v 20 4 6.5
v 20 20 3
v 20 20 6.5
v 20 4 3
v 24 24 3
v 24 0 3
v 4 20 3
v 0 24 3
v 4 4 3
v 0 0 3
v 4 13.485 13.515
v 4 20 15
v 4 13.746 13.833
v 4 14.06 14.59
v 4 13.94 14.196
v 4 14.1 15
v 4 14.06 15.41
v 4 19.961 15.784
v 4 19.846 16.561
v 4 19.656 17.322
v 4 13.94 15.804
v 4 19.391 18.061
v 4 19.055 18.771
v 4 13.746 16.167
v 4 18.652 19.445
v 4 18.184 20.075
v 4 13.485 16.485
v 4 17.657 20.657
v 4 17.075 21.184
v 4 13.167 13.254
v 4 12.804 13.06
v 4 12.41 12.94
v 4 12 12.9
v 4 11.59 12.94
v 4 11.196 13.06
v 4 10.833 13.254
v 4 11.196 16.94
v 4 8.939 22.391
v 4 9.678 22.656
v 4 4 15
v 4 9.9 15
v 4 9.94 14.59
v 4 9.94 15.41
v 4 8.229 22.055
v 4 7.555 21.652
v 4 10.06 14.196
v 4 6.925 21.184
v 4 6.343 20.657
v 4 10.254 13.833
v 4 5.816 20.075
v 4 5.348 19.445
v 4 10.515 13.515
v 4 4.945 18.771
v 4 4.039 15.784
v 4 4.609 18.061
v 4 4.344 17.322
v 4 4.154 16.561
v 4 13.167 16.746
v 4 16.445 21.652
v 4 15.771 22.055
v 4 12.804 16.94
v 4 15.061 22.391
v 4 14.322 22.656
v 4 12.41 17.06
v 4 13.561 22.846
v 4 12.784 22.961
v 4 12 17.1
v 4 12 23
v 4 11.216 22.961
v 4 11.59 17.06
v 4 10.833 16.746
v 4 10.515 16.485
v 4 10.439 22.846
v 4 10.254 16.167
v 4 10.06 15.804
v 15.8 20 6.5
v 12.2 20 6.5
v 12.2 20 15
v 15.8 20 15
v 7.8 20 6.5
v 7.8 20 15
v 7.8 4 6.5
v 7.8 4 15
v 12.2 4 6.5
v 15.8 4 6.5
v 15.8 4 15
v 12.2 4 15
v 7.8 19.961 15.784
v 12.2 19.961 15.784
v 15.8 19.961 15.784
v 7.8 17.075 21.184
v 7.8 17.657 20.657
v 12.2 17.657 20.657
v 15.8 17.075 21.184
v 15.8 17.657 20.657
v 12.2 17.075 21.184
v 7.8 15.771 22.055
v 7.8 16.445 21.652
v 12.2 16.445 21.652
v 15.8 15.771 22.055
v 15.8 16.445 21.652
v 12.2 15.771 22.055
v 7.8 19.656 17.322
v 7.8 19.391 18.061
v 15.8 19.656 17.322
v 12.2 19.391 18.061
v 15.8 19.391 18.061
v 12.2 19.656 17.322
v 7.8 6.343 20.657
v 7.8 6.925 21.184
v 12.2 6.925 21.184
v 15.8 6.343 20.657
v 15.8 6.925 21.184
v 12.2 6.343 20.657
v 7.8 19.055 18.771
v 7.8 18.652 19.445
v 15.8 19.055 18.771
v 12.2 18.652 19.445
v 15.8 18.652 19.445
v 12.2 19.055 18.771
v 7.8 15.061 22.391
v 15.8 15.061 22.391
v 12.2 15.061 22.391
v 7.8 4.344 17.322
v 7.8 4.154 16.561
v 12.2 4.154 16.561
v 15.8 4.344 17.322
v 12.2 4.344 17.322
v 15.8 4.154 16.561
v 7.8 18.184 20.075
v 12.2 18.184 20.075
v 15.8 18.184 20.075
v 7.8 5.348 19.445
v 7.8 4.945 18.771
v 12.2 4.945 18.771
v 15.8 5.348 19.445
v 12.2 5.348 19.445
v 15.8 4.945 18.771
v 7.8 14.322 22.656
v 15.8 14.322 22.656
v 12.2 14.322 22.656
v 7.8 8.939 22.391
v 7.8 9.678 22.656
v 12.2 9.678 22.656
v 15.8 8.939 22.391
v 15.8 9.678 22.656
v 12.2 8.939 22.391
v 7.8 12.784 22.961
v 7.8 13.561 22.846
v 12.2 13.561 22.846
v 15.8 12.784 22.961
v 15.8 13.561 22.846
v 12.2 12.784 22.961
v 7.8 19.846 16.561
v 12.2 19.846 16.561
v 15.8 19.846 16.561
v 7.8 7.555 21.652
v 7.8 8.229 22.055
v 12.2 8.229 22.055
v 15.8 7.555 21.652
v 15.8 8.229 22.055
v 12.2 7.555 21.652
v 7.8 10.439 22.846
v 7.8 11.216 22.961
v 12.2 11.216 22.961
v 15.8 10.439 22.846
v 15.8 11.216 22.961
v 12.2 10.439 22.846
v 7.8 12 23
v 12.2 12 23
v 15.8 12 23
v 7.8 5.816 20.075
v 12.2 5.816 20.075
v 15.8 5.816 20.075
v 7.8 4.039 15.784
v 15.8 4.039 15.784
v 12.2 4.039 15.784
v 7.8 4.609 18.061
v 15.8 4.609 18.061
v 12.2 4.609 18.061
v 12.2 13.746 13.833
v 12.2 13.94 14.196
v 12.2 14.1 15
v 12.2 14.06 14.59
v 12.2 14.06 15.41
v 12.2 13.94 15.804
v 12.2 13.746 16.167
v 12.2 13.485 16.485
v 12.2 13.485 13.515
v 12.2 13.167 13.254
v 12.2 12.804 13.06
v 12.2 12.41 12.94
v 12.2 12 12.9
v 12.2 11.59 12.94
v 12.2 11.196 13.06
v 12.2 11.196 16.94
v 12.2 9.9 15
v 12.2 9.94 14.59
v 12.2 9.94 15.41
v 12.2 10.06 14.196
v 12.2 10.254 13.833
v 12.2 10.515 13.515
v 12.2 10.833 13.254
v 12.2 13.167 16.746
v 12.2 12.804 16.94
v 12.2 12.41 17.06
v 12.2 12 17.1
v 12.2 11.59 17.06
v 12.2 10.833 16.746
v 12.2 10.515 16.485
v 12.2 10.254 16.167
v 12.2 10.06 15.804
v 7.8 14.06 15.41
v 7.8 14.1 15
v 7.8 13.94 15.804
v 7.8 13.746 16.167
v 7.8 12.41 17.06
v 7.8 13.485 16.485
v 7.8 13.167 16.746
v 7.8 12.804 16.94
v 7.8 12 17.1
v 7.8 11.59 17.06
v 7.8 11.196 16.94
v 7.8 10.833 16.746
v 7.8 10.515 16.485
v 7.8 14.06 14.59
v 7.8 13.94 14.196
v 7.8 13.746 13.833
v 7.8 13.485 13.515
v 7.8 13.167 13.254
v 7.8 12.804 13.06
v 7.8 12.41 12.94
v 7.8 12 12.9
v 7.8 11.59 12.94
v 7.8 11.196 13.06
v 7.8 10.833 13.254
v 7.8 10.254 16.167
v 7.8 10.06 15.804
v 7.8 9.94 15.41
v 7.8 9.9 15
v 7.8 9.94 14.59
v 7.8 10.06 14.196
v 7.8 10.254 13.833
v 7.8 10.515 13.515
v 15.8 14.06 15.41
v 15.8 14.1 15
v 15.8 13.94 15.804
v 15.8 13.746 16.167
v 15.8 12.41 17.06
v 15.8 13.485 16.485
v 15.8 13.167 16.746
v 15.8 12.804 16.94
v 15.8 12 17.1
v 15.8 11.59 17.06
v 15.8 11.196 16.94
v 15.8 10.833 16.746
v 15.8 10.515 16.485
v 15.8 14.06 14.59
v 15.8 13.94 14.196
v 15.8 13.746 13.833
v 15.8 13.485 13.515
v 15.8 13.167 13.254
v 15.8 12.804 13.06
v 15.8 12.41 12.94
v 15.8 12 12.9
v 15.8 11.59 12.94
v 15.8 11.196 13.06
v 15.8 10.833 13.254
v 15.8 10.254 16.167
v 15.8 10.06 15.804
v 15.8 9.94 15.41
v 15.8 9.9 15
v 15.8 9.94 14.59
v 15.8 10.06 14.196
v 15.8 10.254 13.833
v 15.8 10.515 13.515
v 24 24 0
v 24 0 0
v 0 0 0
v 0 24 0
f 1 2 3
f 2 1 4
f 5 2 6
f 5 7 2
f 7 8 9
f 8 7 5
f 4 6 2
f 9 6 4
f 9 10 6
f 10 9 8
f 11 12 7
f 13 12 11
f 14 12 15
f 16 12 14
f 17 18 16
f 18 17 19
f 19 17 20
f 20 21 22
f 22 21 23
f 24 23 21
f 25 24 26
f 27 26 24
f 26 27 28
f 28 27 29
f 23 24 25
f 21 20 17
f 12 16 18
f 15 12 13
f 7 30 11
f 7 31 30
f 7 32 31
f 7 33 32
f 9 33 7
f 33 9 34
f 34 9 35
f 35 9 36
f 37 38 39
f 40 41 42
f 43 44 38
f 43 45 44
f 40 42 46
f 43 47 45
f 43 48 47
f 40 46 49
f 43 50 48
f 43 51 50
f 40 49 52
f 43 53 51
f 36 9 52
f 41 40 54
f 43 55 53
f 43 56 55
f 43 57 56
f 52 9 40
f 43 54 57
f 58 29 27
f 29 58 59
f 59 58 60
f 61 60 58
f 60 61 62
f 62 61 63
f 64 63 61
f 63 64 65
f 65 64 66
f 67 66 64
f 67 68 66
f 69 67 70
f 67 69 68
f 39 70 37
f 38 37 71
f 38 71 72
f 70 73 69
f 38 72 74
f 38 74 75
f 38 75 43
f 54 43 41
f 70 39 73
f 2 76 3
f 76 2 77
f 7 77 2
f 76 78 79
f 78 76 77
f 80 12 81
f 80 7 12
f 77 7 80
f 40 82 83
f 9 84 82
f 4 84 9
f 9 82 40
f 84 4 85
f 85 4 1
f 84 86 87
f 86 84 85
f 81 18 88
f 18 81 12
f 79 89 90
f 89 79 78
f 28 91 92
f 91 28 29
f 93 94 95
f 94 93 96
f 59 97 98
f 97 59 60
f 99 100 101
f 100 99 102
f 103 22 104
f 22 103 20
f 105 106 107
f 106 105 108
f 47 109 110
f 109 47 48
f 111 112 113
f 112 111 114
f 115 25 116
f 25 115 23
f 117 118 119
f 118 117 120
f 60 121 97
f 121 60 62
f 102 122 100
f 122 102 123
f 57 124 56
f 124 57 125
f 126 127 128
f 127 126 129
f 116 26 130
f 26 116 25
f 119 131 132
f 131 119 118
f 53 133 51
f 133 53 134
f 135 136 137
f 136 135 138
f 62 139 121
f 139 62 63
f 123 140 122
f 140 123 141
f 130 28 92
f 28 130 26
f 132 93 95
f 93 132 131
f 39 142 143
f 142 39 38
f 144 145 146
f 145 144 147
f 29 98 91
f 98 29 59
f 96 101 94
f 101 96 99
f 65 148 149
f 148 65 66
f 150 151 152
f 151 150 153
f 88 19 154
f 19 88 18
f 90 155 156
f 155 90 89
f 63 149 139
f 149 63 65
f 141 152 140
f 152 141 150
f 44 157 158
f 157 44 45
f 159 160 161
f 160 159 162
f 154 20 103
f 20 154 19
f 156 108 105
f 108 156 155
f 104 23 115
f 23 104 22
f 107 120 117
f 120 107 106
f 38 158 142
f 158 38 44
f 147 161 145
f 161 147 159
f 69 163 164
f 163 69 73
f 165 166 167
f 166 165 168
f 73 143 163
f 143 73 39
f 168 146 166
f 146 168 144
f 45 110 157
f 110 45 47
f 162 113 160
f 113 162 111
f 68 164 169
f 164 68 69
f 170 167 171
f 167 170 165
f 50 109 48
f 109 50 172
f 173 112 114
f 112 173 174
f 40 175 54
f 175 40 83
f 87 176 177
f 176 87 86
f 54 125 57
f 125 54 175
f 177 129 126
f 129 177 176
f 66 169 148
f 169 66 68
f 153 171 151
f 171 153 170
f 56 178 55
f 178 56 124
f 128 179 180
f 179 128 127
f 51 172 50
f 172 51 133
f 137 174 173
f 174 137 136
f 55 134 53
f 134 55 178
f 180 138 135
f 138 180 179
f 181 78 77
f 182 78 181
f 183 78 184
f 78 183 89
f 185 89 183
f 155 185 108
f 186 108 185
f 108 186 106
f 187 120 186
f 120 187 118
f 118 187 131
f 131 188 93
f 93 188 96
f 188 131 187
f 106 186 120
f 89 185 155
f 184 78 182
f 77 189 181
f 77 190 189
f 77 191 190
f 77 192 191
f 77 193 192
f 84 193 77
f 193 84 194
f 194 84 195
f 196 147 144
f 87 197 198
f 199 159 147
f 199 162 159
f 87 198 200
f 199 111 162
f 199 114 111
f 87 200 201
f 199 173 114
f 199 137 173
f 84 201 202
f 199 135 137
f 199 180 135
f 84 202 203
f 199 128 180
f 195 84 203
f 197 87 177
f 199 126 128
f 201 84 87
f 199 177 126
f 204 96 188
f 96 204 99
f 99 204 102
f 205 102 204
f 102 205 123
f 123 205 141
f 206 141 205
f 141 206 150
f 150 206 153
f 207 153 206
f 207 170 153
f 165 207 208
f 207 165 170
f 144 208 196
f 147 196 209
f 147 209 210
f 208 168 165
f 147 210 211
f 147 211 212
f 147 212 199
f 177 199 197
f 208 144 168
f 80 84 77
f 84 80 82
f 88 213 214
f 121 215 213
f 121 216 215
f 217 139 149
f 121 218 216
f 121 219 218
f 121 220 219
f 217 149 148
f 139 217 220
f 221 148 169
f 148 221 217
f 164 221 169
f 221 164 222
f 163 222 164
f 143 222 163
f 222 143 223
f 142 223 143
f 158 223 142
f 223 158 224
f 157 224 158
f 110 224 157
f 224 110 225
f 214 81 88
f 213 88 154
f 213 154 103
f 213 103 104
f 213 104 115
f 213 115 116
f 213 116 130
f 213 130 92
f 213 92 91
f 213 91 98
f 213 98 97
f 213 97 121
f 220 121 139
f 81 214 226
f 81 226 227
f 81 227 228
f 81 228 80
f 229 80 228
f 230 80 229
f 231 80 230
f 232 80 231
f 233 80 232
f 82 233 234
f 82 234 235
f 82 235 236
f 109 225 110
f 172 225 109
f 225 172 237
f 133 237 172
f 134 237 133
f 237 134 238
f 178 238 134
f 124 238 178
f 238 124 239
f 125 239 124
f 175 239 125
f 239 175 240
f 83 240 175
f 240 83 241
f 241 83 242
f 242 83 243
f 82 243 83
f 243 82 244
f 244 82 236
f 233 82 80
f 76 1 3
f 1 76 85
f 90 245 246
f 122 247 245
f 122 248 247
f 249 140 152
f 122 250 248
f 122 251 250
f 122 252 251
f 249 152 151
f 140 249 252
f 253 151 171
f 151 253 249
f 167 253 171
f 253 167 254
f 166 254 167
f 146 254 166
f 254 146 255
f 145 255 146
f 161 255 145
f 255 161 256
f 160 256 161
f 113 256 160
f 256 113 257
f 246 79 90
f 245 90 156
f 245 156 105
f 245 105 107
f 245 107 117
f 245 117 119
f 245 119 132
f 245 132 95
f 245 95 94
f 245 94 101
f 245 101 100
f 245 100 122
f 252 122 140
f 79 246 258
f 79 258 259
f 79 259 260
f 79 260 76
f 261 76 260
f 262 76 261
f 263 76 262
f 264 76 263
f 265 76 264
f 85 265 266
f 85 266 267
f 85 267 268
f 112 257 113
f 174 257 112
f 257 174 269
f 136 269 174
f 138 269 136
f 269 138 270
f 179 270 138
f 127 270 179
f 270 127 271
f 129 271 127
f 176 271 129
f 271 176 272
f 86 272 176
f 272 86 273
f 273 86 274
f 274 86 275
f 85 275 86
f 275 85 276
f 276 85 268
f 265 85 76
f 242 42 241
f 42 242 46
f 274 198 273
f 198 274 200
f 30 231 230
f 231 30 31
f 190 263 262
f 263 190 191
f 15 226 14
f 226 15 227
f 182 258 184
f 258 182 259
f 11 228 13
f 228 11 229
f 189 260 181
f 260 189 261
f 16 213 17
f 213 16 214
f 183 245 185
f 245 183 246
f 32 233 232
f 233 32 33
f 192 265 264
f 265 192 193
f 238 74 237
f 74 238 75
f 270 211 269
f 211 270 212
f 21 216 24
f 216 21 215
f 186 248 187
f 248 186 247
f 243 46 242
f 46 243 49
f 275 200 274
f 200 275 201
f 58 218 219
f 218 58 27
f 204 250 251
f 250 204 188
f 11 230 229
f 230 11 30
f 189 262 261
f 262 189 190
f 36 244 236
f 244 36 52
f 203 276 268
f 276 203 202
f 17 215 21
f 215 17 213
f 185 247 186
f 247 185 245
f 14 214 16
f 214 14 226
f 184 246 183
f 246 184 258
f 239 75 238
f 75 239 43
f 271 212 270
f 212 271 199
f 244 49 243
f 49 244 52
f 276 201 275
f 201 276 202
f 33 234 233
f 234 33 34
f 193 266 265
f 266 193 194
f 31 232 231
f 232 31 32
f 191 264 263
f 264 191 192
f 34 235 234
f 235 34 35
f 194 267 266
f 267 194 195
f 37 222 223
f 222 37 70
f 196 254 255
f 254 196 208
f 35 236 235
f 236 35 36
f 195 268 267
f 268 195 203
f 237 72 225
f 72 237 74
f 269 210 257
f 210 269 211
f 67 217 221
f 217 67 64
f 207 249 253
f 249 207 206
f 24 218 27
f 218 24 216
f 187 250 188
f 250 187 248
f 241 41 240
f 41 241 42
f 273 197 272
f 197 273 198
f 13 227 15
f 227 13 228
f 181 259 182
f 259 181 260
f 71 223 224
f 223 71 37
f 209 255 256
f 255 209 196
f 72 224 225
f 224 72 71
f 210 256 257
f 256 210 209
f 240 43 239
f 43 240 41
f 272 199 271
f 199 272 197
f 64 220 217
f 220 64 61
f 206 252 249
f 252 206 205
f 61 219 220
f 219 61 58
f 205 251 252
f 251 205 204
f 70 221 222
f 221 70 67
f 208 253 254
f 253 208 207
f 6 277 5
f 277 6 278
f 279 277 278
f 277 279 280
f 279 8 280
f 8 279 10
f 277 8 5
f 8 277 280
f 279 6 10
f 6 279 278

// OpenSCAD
union() {
	cube(size = [24, 24, 3]);
	translate(v = [4, 4, 3]) {
		difference() {
			union() {
				cube(size = [16, 16, 12]);
				translate(v = [0, 8, 12]) {
					rotate(a = 90, v = [0, 1, 0]) {
						cylinder($fn = 64, h = 16, r = 8);
					}
				}
			}
			union() {
				translate(v = [3.8000000000, 0, 3.5000000000]) {
					cube(size = [4.4000000000, 16, 25]);
				}
				translate(v = [11.8000000000, 0, 3.5000000000]) {
					cube(size = [4.4000000000, 16, 25]);
				}
				translate(v = [0, 8, 12]) {
					rotate(a = 90, v = [0, 1, 0]) {
						cylinder($fn = 32, h = 16, r = 2.1000000000);
					}
				}
			}
		}
	}
}
